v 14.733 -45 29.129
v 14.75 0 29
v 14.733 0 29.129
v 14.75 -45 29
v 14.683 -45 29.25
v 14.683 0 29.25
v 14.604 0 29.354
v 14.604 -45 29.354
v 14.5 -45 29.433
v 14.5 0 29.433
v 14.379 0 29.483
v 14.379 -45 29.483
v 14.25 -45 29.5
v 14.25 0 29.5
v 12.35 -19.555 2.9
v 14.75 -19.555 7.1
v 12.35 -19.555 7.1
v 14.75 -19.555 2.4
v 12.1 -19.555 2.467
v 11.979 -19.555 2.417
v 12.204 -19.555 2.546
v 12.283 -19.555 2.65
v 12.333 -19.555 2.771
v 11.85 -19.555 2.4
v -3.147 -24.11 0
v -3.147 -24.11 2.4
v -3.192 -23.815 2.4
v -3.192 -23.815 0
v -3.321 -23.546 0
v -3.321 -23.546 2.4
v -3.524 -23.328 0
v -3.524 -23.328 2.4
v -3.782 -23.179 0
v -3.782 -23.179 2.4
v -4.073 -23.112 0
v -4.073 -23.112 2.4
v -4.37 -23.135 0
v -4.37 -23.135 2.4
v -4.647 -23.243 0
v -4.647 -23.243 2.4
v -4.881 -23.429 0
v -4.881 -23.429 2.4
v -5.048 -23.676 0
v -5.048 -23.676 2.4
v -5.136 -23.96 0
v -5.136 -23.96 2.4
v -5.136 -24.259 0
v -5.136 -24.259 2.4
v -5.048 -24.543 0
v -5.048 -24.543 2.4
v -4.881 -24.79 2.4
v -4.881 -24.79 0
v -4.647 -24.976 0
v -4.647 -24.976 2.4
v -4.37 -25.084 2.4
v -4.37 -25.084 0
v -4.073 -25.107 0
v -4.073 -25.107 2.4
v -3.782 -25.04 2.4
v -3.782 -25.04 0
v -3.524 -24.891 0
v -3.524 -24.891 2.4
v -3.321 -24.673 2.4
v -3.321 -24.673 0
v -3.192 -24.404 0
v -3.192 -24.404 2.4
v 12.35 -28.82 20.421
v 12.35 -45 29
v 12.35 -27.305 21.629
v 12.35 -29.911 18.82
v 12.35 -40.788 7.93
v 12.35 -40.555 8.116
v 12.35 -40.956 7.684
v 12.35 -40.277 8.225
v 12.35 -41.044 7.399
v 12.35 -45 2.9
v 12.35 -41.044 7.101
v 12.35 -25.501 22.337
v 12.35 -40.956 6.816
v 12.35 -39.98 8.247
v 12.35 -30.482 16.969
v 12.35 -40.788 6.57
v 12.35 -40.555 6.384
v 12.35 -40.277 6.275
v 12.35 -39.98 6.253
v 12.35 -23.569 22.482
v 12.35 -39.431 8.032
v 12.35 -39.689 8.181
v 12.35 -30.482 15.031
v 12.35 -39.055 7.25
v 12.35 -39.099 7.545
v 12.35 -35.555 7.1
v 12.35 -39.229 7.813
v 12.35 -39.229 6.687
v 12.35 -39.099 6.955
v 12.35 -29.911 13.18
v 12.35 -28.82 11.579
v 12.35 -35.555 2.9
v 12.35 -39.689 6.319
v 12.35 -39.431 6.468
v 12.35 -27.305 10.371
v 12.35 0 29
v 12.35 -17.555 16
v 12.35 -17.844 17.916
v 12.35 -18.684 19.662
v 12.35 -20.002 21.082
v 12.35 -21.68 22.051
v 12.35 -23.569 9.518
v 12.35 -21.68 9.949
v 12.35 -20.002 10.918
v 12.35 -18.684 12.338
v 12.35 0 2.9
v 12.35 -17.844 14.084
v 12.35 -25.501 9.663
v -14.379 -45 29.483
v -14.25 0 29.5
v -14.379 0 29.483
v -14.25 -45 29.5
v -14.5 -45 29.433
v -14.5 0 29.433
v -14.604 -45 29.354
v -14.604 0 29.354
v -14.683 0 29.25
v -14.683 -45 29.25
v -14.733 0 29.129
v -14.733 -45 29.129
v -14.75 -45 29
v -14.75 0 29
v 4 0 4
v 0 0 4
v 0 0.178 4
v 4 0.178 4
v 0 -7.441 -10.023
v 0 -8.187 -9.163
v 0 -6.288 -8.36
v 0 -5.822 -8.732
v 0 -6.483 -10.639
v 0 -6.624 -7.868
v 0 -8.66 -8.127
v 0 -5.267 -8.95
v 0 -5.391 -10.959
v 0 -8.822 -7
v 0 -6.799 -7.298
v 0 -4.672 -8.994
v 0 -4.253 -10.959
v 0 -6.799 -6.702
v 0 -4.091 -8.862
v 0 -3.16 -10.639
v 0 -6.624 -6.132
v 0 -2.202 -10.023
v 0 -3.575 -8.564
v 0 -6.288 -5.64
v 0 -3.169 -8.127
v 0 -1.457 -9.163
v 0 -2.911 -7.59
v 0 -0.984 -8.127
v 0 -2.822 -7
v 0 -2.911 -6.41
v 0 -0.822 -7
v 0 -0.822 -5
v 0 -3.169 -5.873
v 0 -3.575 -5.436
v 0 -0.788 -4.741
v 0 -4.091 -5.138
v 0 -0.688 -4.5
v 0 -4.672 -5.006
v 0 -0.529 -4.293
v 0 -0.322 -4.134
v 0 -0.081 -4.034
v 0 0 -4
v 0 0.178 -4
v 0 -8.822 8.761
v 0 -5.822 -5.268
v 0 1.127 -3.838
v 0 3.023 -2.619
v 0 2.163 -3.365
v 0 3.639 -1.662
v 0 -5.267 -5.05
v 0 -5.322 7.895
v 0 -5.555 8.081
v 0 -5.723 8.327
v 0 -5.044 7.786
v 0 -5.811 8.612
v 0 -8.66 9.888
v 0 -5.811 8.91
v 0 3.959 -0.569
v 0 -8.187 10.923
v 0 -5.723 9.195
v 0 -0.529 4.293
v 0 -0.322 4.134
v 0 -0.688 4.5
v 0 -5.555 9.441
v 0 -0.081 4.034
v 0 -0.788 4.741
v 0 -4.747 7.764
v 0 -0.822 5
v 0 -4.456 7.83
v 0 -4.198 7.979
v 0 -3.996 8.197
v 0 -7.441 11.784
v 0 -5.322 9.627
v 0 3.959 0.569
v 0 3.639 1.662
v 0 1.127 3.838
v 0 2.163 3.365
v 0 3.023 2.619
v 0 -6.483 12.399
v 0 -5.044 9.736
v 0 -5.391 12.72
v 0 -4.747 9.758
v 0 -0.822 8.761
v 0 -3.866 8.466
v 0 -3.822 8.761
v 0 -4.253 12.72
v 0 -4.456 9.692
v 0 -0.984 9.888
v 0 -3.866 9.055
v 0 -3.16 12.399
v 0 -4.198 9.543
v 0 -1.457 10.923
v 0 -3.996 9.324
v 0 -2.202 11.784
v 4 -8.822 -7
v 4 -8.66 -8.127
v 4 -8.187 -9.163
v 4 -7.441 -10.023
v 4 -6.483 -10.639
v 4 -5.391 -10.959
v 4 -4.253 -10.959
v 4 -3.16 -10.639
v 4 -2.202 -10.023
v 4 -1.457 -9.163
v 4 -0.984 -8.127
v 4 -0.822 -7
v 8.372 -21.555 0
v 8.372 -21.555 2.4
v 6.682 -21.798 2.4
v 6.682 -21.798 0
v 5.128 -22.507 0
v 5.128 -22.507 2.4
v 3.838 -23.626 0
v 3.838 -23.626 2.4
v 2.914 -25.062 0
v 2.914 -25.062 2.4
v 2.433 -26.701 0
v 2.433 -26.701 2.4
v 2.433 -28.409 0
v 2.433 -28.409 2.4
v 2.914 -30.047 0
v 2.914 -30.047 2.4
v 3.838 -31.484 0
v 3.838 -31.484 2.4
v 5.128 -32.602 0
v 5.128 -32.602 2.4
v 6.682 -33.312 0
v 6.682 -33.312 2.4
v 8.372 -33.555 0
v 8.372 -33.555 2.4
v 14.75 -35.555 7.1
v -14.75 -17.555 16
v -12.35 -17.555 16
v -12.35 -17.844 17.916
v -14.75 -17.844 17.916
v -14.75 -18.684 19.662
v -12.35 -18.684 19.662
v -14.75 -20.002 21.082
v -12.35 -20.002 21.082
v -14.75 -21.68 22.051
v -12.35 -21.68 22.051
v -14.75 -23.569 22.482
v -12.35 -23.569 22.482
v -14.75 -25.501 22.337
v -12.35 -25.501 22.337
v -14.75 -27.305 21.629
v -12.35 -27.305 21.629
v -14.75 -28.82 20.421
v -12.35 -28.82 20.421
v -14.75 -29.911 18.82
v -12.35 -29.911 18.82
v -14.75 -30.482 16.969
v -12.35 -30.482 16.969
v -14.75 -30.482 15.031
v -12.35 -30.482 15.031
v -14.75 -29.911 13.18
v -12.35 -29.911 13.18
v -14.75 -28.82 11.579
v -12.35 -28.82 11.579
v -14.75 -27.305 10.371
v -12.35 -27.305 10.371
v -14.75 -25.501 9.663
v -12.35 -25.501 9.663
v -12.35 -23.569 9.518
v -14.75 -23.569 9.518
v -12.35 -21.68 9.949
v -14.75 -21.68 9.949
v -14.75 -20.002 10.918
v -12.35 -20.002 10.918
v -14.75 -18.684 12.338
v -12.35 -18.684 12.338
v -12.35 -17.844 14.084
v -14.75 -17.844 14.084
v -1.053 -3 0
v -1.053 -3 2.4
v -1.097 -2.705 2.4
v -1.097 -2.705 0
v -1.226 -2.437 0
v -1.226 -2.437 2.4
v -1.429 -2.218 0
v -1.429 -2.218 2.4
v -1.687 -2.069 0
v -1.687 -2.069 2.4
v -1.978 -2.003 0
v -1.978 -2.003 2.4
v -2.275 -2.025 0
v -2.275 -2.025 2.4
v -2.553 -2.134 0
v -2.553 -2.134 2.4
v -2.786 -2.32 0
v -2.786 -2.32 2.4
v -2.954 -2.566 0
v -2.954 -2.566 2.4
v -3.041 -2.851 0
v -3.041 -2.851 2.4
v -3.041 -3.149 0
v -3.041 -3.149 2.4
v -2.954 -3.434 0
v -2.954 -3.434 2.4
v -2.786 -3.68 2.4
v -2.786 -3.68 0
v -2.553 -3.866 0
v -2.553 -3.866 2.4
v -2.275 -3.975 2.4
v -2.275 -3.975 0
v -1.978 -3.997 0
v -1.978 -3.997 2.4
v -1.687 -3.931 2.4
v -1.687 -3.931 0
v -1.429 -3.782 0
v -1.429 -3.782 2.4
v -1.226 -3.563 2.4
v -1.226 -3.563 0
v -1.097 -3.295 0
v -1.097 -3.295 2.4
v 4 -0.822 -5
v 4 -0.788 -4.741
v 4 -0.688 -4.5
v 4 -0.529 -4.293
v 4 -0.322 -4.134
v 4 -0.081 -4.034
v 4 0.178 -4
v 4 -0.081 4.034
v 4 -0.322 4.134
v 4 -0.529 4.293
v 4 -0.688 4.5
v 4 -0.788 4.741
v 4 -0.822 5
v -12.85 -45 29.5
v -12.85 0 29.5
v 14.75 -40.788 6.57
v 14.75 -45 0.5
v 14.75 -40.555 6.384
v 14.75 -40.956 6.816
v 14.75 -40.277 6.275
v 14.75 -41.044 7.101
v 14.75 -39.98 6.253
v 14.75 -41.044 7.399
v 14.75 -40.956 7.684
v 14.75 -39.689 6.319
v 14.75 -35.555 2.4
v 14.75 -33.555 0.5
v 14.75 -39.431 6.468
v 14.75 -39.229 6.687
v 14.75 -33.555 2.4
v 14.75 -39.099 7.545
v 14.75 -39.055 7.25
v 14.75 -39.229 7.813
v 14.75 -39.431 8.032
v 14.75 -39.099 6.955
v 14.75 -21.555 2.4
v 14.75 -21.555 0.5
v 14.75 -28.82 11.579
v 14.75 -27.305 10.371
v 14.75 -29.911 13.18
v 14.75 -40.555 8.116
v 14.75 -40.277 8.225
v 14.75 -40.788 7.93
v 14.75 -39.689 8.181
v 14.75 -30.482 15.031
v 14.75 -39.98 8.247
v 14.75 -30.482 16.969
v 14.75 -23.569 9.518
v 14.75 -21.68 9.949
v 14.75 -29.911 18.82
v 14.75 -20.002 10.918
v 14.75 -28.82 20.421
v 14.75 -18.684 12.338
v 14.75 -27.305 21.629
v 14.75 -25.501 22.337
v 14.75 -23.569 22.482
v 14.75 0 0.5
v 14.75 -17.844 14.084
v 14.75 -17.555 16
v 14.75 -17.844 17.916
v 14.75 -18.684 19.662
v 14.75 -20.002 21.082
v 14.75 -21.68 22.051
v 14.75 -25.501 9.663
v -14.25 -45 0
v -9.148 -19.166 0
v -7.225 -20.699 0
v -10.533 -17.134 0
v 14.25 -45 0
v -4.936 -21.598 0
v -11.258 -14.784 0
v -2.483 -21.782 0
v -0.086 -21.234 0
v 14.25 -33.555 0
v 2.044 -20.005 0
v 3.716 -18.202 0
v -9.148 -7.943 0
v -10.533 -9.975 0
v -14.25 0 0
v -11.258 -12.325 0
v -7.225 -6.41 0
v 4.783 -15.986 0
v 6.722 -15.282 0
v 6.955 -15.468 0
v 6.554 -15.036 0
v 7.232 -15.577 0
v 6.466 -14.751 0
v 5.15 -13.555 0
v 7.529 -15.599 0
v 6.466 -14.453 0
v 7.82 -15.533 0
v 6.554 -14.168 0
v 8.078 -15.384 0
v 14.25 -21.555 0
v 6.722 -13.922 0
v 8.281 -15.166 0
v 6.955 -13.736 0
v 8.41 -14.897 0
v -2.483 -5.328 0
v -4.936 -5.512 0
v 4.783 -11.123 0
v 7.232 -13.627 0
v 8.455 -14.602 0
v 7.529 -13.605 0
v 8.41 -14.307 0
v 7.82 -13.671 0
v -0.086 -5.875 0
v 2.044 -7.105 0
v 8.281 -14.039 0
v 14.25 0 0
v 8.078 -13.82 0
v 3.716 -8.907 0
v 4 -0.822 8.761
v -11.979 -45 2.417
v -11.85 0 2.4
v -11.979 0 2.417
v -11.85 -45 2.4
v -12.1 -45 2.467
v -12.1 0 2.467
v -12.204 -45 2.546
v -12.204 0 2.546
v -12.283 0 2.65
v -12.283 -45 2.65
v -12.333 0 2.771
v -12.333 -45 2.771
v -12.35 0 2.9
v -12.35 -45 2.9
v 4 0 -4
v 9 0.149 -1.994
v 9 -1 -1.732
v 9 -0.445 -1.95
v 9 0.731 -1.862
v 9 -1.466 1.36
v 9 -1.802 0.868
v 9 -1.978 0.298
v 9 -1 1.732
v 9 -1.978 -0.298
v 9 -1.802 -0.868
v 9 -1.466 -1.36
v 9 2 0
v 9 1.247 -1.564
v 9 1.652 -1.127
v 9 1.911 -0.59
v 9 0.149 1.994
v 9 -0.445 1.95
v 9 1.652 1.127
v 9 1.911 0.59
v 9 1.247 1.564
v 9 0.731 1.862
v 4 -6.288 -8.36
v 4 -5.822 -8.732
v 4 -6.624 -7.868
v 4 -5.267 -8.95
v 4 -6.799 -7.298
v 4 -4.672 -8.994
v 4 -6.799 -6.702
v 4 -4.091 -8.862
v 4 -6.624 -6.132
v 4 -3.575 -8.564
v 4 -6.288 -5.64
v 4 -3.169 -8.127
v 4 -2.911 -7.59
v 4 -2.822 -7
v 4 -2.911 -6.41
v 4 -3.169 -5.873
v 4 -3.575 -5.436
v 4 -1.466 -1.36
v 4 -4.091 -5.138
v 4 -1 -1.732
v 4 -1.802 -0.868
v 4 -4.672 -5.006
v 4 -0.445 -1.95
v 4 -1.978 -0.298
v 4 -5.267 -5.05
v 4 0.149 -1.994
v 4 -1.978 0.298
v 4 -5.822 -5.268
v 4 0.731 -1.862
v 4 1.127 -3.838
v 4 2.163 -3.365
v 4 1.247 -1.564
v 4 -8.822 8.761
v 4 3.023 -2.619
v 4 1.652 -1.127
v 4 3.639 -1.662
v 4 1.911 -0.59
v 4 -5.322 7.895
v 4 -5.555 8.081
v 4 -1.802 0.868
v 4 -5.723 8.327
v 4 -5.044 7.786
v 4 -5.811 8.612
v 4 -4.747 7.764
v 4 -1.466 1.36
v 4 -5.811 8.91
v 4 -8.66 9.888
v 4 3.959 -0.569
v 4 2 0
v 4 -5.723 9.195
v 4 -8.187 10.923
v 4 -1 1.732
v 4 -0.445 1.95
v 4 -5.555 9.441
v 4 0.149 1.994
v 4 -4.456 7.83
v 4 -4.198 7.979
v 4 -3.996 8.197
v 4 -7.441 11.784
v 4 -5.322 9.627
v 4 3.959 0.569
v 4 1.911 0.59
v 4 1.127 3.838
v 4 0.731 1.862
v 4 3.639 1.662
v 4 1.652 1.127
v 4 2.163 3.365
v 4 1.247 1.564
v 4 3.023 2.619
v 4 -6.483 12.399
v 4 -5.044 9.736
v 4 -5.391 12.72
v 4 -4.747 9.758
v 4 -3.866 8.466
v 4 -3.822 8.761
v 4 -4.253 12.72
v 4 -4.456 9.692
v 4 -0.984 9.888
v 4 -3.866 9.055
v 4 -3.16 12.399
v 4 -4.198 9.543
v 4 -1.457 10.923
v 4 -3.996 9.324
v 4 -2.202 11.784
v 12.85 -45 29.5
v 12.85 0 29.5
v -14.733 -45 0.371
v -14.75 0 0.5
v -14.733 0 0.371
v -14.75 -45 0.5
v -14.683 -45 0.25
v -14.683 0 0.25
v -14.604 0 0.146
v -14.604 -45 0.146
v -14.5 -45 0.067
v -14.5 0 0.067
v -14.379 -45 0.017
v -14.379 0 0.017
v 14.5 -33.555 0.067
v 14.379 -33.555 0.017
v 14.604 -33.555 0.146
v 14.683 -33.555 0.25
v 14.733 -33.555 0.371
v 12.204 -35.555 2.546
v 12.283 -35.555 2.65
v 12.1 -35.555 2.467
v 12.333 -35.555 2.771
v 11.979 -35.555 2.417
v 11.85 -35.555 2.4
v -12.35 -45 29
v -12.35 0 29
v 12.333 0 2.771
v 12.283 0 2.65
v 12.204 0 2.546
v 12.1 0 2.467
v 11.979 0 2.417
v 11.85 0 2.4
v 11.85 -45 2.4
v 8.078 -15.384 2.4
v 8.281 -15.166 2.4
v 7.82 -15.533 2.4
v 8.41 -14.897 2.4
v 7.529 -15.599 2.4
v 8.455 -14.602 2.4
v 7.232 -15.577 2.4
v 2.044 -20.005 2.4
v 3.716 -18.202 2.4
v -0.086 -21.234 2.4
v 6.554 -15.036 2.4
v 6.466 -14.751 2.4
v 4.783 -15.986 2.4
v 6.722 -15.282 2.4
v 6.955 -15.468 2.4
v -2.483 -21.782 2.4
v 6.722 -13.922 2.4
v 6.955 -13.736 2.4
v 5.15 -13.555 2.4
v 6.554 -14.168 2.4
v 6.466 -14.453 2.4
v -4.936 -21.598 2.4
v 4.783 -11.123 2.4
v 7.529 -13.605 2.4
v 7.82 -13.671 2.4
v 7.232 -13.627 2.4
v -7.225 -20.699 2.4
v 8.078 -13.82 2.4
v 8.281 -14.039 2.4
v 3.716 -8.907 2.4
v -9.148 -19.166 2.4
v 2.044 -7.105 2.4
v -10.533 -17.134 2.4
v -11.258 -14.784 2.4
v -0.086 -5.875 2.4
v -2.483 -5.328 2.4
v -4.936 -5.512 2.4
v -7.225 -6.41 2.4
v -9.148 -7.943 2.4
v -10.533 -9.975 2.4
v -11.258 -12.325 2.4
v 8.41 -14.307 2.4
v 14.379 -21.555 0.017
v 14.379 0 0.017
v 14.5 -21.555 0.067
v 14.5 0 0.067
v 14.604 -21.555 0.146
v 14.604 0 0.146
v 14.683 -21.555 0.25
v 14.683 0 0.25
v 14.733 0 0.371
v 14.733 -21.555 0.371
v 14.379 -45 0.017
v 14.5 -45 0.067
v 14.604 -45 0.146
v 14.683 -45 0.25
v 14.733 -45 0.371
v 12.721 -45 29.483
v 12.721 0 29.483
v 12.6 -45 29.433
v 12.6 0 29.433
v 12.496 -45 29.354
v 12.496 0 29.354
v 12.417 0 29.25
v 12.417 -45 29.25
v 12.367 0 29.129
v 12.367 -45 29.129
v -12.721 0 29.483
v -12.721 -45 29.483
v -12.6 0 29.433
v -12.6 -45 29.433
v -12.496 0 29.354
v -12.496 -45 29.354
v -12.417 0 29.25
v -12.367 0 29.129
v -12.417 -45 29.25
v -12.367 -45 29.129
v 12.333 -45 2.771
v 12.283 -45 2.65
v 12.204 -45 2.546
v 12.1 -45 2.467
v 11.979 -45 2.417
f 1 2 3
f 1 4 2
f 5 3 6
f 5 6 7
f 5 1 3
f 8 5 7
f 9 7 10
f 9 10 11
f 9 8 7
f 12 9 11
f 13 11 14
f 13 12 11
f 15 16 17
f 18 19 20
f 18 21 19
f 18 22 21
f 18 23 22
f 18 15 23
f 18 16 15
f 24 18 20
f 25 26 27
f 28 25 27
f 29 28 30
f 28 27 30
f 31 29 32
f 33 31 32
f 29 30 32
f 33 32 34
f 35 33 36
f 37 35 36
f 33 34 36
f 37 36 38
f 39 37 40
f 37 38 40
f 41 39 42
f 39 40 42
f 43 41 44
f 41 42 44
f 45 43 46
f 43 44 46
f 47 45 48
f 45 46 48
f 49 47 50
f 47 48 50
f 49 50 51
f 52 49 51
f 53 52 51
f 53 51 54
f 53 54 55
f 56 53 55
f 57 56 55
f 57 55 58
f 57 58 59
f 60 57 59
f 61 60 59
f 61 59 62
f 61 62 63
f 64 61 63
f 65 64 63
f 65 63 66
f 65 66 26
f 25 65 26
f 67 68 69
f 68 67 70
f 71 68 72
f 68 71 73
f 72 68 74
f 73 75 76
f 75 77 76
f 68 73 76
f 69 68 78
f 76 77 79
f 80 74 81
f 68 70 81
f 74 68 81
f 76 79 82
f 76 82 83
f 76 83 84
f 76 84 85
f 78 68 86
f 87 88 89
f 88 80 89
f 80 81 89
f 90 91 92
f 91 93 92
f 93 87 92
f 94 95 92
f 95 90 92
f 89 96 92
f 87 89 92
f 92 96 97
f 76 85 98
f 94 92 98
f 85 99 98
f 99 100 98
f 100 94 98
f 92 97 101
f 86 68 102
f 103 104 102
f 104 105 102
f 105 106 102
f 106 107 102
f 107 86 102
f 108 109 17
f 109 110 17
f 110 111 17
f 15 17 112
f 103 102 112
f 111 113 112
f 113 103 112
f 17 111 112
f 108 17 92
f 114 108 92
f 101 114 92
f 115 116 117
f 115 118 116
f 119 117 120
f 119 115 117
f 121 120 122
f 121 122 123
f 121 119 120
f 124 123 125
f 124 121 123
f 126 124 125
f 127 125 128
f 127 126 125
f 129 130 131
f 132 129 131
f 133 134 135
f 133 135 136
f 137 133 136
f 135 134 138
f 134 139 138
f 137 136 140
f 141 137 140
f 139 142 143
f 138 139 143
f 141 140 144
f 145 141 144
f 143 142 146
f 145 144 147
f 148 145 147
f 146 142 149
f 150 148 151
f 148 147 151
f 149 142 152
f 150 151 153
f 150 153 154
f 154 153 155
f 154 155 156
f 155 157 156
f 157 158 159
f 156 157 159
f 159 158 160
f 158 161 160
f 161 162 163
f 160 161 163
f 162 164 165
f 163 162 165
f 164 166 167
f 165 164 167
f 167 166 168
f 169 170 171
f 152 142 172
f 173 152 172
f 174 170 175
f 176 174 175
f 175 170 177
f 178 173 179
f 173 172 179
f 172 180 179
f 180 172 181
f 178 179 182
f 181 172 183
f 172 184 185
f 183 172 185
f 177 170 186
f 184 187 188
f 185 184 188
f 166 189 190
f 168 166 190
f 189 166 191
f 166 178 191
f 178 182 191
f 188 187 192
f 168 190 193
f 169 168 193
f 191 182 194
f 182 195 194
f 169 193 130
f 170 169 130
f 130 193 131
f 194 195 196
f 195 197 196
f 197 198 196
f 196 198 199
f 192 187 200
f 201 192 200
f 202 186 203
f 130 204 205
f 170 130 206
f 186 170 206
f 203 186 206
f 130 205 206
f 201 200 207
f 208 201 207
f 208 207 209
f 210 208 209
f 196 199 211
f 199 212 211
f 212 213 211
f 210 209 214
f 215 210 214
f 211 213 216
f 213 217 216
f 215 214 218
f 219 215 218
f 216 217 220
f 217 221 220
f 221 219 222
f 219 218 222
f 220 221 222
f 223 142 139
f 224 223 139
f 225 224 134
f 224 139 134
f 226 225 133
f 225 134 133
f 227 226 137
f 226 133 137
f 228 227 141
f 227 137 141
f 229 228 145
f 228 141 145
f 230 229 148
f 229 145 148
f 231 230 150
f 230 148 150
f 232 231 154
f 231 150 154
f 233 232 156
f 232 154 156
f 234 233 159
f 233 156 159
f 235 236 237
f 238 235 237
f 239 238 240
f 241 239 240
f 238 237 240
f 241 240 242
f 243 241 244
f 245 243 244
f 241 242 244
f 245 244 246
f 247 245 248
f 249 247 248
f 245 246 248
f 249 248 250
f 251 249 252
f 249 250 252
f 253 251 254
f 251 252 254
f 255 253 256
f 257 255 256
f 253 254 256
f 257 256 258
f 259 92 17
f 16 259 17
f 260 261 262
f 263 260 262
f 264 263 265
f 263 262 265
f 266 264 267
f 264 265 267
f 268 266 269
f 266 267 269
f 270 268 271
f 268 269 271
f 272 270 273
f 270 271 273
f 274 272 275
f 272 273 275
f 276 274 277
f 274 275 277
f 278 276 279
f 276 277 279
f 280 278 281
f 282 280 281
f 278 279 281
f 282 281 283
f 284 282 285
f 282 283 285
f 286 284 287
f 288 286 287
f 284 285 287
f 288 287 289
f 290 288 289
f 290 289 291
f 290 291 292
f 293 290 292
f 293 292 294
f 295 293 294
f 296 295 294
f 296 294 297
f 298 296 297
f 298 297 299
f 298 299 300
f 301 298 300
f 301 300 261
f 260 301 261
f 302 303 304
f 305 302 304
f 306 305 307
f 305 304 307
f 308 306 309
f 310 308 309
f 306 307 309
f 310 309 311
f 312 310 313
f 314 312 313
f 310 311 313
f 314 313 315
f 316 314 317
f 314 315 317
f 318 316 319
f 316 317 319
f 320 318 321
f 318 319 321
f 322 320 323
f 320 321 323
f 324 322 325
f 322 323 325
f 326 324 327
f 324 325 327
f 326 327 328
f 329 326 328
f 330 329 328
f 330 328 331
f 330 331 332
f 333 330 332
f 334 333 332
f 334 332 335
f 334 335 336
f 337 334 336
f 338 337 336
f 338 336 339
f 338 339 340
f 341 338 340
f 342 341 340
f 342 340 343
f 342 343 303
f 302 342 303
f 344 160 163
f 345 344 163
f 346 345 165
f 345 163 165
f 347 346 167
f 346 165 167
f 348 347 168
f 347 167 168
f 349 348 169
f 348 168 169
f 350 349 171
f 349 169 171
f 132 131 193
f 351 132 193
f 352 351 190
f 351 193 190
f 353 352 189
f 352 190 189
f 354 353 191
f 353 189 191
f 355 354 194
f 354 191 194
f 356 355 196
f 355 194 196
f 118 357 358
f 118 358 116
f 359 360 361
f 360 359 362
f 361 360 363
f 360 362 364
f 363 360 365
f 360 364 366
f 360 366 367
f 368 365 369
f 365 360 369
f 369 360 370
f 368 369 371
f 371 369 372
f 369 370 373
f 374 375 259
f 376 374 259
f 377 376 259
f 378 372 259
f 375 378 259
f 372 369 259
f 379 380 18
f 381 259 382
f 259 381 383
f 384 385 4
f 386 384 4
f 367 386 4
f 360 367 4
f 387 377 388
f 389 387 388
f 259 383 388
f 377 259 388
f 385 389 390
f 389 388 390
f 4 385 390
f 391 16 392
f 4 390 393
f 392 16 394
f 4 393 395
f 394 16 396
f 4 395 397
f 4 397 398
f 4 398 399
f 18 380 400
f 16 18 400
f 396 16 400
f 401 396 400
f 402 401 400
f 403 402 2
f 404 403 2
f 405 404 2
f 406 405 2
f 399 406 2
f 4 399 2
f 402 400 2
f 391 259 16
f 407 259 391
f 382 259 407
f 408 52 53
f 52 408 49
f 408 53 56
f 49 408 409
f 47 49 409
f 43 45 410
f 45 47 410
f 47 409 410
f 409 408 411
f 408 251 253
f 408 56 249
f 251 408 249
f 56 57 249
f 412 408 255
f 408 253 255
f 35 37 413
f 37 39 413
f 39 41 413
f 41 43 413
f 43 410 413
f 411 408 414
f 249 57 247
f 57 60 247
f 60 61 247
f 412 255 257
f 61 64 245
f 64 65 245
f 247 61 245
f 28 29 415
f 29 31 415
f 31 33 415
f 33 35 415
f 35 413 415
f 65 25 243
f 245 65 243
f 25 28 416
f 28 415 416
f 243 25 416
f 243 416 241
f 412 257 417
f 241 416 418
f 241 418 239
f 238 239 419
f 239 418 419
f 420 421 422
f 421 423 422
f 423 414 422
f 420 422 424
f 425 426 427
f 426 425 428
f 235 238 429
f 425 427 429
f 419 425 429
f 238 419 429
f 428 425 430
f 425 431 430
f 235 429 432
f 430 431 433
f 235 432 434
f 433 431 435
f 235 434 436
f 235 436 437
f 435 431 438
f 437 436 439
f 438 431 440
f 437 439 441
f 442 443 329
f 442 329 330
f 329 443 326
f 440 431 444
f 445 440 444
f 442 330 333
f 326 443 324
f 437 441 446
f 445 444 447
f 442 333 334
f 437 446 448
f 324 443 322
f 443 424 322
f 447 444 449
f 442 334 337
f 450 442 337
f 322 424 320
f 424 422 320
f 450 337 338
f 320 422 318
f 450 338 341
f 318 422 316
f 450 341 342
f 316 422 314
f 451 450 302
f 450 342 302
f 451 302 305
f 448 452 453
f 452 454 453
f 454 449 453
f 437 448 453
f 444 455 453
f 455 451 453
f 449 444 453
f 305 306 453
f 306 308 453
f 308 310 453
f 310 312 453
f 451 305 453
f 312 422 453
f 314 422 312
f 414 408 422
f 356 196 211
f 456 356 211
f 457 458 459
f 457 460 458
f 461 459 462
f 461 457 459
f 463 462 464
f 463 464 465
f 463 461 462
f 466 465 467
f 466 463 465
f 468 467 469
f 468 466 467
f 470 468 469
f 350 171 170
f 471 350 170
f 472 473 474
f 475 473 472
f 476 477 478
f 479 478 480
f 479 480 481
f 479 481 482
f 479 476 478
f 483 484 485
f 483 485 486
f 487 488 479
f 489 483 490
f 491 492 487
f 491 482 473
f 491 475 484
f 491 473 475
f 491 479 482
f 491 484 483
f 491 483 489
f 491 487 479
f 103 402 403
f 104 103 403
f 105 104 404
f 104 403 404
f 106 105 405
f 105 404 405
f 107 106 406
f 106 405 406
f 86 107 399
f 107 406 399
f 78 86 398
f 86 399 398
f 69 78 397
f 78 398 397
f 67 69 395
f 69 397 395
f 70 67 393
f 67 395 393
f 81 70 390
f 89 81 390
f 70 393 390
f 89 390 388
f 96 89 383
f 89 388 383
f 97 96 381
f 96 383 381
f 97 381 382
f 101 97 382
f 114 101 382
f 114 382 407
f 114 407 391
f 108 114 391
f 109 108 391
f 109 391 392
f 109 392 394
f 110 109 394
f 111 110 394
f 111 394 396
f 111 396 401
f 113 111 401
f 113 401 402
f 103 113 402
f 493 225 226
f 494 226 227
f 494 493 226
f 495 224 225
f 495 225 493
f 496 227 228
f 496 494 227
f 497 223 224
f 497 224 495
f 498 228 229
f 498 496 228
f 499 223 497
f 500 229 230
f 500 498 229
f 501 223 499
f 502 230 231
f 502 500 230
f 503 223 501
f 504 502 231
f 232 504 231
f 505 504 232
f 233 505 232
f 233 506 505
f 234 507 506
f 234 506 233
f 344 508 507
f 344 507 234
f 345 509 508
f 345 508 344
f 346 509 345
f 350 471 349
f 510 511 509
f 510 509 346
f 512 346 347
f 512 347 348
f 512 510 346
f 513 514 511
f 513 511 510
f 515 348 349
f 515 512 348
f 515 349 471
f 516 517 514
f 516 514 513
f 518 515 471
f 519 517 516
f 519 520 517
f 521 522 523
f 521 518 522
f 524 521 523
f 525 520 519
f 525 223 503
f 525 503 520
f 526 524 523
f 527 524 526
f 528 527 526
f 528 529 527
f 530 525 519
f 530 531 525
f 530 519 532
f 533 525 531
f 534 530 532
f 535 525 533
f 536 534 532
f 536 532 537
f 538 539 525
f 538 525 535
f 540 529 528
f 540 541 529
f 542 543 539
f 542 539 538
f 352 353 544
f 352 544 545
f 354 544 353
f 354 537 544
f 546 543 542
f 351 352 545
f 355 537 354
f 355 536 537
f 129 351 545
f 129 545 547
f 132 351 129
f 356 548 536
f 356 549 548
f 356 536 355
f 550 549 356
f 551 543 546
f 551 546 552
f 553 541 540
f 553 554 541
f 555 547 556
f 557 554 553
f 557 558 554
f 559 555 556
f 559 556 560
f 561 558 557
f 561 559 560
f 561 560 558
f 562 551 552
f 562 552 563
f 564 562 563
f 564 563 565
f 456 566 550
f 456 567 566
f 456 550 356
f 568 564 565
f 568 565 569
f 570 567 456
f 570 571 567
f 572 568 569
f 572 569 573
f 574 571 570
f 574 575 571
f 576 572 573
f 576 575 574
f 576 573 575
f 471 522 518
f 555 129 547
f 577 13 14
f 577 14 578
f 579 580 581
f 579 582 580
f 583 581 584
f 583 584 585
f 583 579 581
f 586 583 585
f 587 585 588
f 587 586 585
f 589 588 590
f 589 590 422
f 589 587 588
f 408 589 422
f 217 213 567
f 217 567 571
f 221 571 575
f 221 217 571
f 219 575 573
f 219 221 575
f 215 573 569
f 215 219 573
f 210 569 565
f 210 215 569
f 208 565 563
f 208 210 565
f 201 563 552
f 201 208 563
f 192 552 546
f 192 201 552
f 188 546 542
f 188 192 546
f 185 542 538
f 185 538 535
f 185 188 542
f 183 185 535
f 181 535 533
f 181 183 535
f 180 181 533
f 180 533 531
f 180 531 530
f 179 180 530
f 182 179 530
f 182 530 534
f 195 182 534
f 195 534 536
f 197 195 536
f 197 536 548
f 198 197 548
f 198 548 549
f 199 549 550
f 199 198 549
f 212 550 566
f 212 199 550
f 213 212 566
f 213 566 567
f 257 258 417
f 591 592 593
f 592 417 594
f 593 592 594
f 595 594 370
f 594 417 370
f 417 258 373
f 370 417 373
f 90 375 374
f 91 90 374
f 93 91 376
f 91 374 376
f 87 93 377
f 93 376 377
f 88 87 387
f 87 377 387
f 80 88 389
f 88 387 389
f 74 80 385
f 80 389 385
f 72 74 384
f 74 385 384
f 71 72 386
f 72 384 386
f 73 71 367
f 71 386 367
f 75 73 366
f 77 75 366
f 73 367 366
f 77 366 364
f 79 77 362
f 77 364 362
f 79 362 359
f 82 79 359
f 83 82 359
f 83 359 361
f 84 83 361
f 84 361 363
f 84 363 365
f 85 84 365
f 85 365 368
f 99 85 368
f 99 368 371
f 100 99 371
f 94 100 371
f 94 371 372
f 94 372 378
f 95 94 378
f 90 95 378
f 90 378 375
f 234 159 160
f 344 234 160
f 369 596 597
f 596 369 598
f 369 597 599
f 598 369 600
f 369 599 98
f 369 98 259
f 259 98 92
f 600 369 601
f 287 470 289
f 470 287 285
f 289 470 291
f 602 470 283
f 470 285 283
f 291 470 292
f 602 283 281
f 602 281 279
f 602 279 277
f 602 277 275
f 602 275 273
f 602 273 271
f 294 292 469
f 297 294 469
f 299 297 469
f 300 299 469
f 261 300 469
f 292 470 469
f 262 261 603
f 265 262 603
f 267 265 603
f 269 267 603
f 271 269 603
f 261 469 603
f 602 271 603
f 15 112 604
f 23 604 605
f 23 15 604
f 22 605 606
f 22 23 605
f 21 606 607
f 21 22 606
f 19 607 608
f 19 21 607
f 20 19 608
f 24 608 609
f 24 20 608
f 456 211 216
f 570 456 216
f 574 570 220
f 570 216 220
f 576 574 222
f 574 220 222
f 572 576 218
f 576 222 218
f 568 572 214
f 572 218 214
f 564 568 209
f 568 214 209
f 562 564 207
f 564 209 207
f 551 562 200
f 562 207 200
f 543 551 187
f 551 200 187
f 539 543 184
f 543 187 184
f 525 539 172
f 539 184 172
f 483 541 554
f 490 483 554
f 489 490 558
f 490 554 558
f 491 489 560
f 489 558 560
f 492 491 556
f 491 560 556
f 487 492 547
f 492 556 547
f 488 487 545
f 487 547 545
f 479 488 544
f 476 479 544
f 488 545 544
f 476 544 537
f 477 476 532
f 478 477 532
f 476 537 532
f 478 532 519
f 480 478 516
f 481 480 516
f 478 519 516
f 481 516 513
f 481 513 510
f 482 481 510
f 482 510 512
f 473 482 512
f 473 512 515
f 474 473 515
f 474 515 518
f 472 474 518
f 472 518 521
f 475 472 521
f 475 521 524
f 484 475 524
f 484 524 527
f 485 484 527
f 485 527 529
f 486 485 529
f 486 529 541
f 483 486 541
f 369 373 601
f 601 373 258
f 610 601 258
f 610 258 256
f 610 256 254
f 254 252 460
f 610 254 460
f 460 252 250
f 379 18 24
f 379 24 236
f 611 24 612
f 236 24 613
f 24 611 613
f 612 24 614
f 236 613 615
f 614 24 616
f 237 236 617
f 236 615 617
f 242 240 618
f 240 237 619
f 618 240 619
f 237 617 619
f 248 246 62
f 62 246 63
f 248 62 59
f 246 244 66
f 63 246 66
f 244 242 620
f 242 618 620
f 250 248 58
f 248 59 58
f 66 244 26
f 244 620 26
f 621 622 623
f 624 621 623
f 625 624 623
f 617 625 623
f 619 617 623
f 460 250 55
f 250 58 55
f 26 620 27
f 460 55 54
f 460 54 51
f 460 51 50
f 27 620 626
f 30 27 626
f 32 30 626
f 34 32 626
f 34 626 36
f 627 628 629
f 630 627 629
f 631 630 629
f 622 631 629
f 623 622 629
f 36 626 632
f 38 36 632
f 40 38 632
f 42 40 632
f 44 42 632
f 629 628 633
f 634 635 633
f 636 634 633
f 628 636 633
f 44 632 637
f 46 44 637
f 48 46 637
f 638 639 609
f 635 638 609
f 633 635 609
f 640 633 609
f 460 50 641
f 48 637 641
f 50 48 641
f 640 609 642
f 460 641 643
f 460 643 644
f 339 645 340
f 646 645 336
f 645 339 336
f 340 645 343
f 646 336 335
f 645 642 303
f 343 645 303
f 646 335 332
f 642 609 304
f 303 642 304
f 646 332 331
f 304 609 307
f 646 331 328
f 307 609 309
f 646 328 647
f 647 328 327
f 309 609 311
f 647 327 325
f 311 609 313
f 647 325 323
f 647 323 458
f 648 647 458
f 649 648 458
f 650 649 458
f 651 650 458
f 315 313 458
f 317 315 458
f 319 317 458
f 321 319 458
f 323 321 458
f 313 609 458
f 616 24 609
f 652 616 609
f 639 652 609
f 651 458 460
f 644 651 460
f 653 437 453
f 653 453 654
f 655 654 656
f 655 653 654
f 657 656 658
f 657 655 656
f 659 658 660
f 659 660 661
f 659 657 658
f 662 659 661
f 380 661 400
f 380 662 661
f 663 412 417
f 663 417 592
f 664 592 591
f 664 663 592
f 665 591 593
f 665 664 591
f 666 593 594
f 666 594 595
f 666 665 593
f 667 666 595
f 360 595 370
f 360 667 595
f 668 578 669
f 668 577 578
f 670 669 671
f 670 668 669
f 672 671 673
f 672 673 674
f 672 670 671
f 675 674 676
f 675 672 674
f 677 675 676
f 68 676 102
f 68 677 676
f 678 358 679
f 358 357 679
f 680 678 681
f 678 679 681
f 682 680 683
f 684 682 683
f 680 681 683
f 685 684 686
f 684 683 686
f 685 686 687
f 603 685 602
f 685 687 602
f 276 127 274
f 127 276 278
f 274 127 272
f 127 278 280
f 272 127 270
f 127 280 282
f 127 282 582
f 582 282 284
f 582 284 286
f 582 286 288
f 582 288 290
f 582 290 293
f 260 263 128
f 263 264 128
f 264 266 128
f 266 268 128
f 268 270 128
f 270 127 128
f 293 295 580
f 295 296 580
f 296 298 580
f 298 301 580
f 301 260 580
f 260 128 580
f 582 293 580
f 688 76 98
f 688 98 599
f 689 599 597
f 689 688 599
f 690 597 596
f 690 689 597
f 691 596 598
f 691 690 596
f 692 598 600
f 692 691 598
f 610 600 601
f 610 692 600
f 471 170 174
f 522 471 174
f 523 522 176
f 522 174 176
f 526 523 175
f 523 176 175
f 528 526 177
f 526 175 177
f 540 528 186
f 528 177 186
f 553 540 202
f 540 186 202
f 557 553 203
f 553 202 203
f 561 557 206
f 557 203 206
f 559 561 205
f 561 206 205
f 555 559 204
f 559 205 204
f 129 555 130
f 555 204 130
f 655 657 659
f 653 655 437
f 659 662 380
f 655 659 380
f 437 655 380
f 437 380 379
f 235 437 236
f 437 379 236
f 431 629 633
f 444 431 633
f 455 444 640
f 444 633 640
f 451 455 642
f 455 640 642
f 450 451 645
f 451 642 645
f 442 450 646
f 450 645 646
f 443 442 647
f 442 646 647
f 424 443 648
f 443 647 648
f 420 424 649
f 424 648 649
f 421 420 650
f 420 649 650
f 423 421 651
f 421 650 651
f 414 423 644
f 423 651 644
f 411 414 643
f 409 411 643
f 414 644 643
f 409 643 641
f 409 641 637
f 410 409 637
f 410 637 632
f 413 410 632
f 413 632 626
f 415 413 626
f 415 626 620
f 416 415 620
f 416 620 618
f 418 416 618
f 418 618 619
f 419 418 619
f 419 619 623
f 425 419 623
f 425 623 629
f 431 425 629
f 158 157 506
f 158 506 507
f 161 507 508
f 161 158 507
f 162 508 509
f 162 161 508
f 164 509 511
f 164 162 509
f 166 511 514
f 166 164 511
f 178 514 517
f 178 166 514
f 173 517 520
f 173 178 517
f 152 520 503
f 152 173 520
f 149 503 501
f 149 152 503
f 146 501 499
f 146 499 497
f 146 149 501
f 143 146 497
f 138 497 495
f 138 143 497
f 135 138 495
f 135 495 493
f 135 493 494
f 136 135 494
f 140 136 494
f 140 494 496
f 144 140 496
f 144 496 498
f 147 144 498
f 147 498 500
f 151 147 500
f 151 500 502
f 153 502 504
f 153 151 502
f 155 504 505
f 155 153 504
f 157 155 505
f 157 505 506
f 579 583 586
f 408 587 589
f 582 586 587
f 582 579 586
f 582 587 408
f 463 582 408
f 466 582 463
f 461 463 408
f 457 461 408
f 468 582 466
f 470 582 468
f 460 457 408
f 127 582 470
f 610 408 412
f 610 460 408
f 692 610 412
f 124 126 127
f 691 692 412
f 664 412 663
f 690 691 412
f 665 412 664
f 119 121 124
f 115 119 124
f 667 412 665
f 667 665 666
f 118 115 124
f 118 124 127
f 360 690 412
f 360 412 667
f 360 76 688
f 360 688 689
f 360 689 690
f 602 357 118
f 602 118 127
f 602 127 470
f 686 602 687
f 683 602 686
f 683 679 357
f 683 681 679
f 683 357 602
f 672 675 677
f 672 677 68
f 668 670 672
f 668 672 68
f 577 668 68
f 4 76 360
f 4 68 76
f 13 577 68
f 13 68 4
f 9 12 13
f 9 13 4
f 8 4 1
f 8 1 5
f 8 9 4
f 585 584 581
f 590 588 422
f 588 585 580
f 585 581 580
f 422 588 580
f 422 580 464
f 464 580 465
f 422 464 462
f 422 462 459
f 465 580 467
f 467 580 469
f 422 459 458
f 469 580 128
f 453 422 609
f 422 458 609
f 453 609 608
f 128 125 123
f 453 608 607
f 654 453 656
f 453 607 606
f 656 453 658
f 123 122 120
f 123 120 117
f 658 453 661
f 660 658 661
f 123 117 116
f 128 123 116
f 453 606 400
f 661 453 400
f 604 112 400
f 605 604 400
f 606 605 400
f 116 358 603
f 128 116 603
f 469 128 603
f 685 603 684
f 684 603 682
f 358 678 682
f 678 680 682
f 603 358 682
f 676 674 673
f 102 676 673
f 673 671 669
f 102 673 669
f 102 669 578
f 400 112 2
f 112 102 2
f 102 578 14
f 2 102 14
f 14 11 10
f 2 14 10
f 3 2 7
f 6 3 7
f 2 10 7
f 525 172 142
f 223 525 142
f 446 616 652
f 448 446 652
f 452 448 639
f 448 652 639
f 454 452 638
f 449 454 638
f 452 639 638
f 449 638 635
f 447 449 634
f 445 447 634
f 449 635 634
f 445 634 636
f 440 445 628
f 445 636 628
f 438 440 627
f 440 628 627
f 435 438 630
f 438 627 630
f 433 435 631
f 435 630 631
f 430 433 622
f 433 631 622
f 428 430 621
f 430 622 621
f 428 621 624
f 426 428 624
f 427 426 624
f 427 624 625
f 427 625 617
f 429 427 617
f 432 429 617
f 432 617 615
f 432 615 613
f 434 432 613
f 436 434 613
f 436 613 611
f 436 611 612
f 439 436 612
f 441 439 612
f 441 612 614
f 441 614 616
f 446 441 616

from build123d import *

# Parameters (mm, degrees)
F1_DEPTH      = 45
F2_R          = 0.5
F3_R          = 8.25
F3_R_2        = 1
F4_DEPTH      = 2.401
F5_R          = 6.5
F6_DEPTH      = 29.501
F8_DEPTH      = 2.401
F8_DEPTH_BACK = 3
F9_R          = 2
F9_R_2        = 1
F10_DEPTH     = 4
F11_DEPTH     = 9
F5_R_2        = 1
F12_DEPTH     = 5


with BuildPart() as f1:
    # F0 (on Front) → F1 (new body)
    with BuildSketch(Plane.XZ):
        Polygon((-12.35, 29.5), (-14.75, 29.5), (-14.75, 0), (0, 0), (0, 2.4), (-12.35, 2.4), align=None)
        Polygon((0, 2.4), (0, 0), (14.75, 0), (14.75, 29.5), (12.35, 29.5), (12.35, 2.4), align=None)
    extrude(amount=F1_DEPTH)

    # F2
    f2_edges = [f1.edges().sort_by_distance(p)[0] for p in [
        (-14.75, -22.5, 29.5),
        (-12.35, -22.5, 29.5),
        (12.35, -22.5, 29.5),
        (14.75, -22.5, 29.5),
        (14.75, -22.5, 0),
        (-14.75, -22.5, 0),
        (-12.35, -22.5, 2.4),
        (12.35, -22.5, 2.4),
    ]]
    fillet(f2_edges, radius=F2_R)

    # F3 (on face) → F4 (cut, through all)
    with BuildSketch(Plane.XY.offset(2.4)):
        with Locations((-3.1, -13.5547542126)):
            Circle(F3_R)
        with Locations((-4.1474557321, -24.1095084253)):
            Circle(F3_R_2)
        with Locations((7.4547542126, -14.6022099448)):
            Circle(F3_R_2)
        with Locations((-2.0525442679, -3)):
            Circle(F3_R_2)
        with BuildLine():
            Line((14.75, -21.5547542126), (13.6636427886, -21.5547542126))
            ThreePointArc((13.6636427886, -21.5547542126), (14.2361058268, -22.1128881049), (14.75, -22.7253749622))
            Line((14.75, -22.7253749622), (14.75, -21.5547542126))
        make_face()
        with BuildLine():
            ThreePointArc((14.75, -32.3841334631), (14.2361058268, -32.9966203204), (13.6636427886, -33.5547542126))
            Line((13.6636427886, -33.5547542126), (14.75, -33.5547542126))
            Line((14.75, -33.5547542126), (14.75, -32.3841334631))
        make_face()
        with BuildLine():
            Line((11.85, -21.5547542126), (8.3721401665, -21.5547542126))
            ThreePointArc((8.3721401665, -21.5547542126), (2.3721401665, -27.5547542126), (8.3721401665, -33.5547542126))
            Line((8.3721401665, -33.5547542126), (11.85, -33.5547542126))
            Line((11.85, -33.5547542126), (11.85, -21.5547542126))
        make_face()
        with BuildLine():
            Line((13.6636427886, -21.5547542126), (11.85, -21.5547542126))
            Line((11.85, -21.5547542126), (11.85, -33.5547542126))
            Line((11.85, -33.5547542126), (13.6636427886, -33.5547542126))
            ThreePointArc((13.6636427886, -33.5547542126), (14.2361058268, -32.9966203204), (14.75, -32.3841334631))
            Line((14.75, -32.3841334631), (14.75, -22.7253749622))
            ThreePointArc((14.75, -22.7253749622), (14.2361058268, -22.1128881049), (13.6636427886, -21.5547542126))
        make_face()
    extrude(amount=-F4_DEPTH, mode=Mode.SUBTRACT)

    # F5 (on face) → F6 (cut, through all)
    with BuildSketch(Plane.YZ.offset(14.75)):
        with Locations((-24.0547542126, 16)):
            Circle(F5_R)
    extrude(amount=-F6_DEPTH, mode=Mode.SUBTRACT)

    # F7 (on face) → F8 (cut, two sides)
    with BuildSketch(Plane(origin=(12.35, 0, 0), x_dir=(0, -1, 0), z_dir=(-1, 0, 0))) as f8_sk:
        Polygon((19.5547542126, 2.4), (27.5547542126, 2.4), (35.5547542126, 2.4), (35.5547542126, 7.1), (19.5547542126, 7.1), align=None)
    extrude(amount=-F8_DEPTH, mode=Mode.SUBTRACT)
    extrude(f8_sk.sketch, amount=F8_DEPTH_BACK, mode=Mode.SUBTRACT)

    # F5 (on face) → F12 (cut)
    with BuildSketch(Plane.YZ.offset(14.75)):
        with Locations((-40.0547542126, 7.25)):
            Circle(F5_R_2)
    extrude(amount=-F12_DEPTH, mode=Mode.SUBTRACT)


with BuildPart() as f10:
    # F9 (on Right) → F10 (new body)
    with BuildSketch(Plane.YZ):
        with BuildLine():
            ThreePointArc((-0.8218253805, 8.760707734), (-4.8218253805, 12.760707734), (-8.8218253805, 8.760707734))
            Line((-8.8218253805, 8.760707734), (-8.8218253805, -7))
            ThreePointArc((-8.8218253805, -7), (-4.8218253805, -11), (-0.8218253805, -7))
            Line((-0.8218253805, -7), (-0.8218253805, -5))
            ThreePointArc((-0.8218253805, -5), (-0.5289321617, -4.2928932188), (0.1781746195, -4))
            Line((0.1781746195, -4), (0, -4))
            ThreePointArc((0, -4), (4, 0), (0, 4))
            Line((0, 4), (0.1781746195, 4))
            ThreePointArc((0.1781746195, 4), (-0.5289321617, 4.2928932188), (-0.8218253805, 5))
            Line((-0.8218253805, 5), (-0.8218253805, 8.760707734))
        make_face()
        with Locations((-4.8218253805, -7)):
            Circle(F9_R, mode=Mode.SUBTRACT)
        Circle(F9_R, mode=Mode.SUBTRACT)
        with Locations((-4.8218253805, 8.760707734)):
            Circle(F9_R_2, mode=Mode.SUBTRACT)
        Circle(F9_R)
    extrude(amount=F10_DEPTH)

    # F9 (on Right) → F11 (join)
    with BuildSketch(Plane.YZ):
        Circle(F9_R)
    extrude(amount=F11_DEPTH)


solid = Compound([f1.part, f10.part])
